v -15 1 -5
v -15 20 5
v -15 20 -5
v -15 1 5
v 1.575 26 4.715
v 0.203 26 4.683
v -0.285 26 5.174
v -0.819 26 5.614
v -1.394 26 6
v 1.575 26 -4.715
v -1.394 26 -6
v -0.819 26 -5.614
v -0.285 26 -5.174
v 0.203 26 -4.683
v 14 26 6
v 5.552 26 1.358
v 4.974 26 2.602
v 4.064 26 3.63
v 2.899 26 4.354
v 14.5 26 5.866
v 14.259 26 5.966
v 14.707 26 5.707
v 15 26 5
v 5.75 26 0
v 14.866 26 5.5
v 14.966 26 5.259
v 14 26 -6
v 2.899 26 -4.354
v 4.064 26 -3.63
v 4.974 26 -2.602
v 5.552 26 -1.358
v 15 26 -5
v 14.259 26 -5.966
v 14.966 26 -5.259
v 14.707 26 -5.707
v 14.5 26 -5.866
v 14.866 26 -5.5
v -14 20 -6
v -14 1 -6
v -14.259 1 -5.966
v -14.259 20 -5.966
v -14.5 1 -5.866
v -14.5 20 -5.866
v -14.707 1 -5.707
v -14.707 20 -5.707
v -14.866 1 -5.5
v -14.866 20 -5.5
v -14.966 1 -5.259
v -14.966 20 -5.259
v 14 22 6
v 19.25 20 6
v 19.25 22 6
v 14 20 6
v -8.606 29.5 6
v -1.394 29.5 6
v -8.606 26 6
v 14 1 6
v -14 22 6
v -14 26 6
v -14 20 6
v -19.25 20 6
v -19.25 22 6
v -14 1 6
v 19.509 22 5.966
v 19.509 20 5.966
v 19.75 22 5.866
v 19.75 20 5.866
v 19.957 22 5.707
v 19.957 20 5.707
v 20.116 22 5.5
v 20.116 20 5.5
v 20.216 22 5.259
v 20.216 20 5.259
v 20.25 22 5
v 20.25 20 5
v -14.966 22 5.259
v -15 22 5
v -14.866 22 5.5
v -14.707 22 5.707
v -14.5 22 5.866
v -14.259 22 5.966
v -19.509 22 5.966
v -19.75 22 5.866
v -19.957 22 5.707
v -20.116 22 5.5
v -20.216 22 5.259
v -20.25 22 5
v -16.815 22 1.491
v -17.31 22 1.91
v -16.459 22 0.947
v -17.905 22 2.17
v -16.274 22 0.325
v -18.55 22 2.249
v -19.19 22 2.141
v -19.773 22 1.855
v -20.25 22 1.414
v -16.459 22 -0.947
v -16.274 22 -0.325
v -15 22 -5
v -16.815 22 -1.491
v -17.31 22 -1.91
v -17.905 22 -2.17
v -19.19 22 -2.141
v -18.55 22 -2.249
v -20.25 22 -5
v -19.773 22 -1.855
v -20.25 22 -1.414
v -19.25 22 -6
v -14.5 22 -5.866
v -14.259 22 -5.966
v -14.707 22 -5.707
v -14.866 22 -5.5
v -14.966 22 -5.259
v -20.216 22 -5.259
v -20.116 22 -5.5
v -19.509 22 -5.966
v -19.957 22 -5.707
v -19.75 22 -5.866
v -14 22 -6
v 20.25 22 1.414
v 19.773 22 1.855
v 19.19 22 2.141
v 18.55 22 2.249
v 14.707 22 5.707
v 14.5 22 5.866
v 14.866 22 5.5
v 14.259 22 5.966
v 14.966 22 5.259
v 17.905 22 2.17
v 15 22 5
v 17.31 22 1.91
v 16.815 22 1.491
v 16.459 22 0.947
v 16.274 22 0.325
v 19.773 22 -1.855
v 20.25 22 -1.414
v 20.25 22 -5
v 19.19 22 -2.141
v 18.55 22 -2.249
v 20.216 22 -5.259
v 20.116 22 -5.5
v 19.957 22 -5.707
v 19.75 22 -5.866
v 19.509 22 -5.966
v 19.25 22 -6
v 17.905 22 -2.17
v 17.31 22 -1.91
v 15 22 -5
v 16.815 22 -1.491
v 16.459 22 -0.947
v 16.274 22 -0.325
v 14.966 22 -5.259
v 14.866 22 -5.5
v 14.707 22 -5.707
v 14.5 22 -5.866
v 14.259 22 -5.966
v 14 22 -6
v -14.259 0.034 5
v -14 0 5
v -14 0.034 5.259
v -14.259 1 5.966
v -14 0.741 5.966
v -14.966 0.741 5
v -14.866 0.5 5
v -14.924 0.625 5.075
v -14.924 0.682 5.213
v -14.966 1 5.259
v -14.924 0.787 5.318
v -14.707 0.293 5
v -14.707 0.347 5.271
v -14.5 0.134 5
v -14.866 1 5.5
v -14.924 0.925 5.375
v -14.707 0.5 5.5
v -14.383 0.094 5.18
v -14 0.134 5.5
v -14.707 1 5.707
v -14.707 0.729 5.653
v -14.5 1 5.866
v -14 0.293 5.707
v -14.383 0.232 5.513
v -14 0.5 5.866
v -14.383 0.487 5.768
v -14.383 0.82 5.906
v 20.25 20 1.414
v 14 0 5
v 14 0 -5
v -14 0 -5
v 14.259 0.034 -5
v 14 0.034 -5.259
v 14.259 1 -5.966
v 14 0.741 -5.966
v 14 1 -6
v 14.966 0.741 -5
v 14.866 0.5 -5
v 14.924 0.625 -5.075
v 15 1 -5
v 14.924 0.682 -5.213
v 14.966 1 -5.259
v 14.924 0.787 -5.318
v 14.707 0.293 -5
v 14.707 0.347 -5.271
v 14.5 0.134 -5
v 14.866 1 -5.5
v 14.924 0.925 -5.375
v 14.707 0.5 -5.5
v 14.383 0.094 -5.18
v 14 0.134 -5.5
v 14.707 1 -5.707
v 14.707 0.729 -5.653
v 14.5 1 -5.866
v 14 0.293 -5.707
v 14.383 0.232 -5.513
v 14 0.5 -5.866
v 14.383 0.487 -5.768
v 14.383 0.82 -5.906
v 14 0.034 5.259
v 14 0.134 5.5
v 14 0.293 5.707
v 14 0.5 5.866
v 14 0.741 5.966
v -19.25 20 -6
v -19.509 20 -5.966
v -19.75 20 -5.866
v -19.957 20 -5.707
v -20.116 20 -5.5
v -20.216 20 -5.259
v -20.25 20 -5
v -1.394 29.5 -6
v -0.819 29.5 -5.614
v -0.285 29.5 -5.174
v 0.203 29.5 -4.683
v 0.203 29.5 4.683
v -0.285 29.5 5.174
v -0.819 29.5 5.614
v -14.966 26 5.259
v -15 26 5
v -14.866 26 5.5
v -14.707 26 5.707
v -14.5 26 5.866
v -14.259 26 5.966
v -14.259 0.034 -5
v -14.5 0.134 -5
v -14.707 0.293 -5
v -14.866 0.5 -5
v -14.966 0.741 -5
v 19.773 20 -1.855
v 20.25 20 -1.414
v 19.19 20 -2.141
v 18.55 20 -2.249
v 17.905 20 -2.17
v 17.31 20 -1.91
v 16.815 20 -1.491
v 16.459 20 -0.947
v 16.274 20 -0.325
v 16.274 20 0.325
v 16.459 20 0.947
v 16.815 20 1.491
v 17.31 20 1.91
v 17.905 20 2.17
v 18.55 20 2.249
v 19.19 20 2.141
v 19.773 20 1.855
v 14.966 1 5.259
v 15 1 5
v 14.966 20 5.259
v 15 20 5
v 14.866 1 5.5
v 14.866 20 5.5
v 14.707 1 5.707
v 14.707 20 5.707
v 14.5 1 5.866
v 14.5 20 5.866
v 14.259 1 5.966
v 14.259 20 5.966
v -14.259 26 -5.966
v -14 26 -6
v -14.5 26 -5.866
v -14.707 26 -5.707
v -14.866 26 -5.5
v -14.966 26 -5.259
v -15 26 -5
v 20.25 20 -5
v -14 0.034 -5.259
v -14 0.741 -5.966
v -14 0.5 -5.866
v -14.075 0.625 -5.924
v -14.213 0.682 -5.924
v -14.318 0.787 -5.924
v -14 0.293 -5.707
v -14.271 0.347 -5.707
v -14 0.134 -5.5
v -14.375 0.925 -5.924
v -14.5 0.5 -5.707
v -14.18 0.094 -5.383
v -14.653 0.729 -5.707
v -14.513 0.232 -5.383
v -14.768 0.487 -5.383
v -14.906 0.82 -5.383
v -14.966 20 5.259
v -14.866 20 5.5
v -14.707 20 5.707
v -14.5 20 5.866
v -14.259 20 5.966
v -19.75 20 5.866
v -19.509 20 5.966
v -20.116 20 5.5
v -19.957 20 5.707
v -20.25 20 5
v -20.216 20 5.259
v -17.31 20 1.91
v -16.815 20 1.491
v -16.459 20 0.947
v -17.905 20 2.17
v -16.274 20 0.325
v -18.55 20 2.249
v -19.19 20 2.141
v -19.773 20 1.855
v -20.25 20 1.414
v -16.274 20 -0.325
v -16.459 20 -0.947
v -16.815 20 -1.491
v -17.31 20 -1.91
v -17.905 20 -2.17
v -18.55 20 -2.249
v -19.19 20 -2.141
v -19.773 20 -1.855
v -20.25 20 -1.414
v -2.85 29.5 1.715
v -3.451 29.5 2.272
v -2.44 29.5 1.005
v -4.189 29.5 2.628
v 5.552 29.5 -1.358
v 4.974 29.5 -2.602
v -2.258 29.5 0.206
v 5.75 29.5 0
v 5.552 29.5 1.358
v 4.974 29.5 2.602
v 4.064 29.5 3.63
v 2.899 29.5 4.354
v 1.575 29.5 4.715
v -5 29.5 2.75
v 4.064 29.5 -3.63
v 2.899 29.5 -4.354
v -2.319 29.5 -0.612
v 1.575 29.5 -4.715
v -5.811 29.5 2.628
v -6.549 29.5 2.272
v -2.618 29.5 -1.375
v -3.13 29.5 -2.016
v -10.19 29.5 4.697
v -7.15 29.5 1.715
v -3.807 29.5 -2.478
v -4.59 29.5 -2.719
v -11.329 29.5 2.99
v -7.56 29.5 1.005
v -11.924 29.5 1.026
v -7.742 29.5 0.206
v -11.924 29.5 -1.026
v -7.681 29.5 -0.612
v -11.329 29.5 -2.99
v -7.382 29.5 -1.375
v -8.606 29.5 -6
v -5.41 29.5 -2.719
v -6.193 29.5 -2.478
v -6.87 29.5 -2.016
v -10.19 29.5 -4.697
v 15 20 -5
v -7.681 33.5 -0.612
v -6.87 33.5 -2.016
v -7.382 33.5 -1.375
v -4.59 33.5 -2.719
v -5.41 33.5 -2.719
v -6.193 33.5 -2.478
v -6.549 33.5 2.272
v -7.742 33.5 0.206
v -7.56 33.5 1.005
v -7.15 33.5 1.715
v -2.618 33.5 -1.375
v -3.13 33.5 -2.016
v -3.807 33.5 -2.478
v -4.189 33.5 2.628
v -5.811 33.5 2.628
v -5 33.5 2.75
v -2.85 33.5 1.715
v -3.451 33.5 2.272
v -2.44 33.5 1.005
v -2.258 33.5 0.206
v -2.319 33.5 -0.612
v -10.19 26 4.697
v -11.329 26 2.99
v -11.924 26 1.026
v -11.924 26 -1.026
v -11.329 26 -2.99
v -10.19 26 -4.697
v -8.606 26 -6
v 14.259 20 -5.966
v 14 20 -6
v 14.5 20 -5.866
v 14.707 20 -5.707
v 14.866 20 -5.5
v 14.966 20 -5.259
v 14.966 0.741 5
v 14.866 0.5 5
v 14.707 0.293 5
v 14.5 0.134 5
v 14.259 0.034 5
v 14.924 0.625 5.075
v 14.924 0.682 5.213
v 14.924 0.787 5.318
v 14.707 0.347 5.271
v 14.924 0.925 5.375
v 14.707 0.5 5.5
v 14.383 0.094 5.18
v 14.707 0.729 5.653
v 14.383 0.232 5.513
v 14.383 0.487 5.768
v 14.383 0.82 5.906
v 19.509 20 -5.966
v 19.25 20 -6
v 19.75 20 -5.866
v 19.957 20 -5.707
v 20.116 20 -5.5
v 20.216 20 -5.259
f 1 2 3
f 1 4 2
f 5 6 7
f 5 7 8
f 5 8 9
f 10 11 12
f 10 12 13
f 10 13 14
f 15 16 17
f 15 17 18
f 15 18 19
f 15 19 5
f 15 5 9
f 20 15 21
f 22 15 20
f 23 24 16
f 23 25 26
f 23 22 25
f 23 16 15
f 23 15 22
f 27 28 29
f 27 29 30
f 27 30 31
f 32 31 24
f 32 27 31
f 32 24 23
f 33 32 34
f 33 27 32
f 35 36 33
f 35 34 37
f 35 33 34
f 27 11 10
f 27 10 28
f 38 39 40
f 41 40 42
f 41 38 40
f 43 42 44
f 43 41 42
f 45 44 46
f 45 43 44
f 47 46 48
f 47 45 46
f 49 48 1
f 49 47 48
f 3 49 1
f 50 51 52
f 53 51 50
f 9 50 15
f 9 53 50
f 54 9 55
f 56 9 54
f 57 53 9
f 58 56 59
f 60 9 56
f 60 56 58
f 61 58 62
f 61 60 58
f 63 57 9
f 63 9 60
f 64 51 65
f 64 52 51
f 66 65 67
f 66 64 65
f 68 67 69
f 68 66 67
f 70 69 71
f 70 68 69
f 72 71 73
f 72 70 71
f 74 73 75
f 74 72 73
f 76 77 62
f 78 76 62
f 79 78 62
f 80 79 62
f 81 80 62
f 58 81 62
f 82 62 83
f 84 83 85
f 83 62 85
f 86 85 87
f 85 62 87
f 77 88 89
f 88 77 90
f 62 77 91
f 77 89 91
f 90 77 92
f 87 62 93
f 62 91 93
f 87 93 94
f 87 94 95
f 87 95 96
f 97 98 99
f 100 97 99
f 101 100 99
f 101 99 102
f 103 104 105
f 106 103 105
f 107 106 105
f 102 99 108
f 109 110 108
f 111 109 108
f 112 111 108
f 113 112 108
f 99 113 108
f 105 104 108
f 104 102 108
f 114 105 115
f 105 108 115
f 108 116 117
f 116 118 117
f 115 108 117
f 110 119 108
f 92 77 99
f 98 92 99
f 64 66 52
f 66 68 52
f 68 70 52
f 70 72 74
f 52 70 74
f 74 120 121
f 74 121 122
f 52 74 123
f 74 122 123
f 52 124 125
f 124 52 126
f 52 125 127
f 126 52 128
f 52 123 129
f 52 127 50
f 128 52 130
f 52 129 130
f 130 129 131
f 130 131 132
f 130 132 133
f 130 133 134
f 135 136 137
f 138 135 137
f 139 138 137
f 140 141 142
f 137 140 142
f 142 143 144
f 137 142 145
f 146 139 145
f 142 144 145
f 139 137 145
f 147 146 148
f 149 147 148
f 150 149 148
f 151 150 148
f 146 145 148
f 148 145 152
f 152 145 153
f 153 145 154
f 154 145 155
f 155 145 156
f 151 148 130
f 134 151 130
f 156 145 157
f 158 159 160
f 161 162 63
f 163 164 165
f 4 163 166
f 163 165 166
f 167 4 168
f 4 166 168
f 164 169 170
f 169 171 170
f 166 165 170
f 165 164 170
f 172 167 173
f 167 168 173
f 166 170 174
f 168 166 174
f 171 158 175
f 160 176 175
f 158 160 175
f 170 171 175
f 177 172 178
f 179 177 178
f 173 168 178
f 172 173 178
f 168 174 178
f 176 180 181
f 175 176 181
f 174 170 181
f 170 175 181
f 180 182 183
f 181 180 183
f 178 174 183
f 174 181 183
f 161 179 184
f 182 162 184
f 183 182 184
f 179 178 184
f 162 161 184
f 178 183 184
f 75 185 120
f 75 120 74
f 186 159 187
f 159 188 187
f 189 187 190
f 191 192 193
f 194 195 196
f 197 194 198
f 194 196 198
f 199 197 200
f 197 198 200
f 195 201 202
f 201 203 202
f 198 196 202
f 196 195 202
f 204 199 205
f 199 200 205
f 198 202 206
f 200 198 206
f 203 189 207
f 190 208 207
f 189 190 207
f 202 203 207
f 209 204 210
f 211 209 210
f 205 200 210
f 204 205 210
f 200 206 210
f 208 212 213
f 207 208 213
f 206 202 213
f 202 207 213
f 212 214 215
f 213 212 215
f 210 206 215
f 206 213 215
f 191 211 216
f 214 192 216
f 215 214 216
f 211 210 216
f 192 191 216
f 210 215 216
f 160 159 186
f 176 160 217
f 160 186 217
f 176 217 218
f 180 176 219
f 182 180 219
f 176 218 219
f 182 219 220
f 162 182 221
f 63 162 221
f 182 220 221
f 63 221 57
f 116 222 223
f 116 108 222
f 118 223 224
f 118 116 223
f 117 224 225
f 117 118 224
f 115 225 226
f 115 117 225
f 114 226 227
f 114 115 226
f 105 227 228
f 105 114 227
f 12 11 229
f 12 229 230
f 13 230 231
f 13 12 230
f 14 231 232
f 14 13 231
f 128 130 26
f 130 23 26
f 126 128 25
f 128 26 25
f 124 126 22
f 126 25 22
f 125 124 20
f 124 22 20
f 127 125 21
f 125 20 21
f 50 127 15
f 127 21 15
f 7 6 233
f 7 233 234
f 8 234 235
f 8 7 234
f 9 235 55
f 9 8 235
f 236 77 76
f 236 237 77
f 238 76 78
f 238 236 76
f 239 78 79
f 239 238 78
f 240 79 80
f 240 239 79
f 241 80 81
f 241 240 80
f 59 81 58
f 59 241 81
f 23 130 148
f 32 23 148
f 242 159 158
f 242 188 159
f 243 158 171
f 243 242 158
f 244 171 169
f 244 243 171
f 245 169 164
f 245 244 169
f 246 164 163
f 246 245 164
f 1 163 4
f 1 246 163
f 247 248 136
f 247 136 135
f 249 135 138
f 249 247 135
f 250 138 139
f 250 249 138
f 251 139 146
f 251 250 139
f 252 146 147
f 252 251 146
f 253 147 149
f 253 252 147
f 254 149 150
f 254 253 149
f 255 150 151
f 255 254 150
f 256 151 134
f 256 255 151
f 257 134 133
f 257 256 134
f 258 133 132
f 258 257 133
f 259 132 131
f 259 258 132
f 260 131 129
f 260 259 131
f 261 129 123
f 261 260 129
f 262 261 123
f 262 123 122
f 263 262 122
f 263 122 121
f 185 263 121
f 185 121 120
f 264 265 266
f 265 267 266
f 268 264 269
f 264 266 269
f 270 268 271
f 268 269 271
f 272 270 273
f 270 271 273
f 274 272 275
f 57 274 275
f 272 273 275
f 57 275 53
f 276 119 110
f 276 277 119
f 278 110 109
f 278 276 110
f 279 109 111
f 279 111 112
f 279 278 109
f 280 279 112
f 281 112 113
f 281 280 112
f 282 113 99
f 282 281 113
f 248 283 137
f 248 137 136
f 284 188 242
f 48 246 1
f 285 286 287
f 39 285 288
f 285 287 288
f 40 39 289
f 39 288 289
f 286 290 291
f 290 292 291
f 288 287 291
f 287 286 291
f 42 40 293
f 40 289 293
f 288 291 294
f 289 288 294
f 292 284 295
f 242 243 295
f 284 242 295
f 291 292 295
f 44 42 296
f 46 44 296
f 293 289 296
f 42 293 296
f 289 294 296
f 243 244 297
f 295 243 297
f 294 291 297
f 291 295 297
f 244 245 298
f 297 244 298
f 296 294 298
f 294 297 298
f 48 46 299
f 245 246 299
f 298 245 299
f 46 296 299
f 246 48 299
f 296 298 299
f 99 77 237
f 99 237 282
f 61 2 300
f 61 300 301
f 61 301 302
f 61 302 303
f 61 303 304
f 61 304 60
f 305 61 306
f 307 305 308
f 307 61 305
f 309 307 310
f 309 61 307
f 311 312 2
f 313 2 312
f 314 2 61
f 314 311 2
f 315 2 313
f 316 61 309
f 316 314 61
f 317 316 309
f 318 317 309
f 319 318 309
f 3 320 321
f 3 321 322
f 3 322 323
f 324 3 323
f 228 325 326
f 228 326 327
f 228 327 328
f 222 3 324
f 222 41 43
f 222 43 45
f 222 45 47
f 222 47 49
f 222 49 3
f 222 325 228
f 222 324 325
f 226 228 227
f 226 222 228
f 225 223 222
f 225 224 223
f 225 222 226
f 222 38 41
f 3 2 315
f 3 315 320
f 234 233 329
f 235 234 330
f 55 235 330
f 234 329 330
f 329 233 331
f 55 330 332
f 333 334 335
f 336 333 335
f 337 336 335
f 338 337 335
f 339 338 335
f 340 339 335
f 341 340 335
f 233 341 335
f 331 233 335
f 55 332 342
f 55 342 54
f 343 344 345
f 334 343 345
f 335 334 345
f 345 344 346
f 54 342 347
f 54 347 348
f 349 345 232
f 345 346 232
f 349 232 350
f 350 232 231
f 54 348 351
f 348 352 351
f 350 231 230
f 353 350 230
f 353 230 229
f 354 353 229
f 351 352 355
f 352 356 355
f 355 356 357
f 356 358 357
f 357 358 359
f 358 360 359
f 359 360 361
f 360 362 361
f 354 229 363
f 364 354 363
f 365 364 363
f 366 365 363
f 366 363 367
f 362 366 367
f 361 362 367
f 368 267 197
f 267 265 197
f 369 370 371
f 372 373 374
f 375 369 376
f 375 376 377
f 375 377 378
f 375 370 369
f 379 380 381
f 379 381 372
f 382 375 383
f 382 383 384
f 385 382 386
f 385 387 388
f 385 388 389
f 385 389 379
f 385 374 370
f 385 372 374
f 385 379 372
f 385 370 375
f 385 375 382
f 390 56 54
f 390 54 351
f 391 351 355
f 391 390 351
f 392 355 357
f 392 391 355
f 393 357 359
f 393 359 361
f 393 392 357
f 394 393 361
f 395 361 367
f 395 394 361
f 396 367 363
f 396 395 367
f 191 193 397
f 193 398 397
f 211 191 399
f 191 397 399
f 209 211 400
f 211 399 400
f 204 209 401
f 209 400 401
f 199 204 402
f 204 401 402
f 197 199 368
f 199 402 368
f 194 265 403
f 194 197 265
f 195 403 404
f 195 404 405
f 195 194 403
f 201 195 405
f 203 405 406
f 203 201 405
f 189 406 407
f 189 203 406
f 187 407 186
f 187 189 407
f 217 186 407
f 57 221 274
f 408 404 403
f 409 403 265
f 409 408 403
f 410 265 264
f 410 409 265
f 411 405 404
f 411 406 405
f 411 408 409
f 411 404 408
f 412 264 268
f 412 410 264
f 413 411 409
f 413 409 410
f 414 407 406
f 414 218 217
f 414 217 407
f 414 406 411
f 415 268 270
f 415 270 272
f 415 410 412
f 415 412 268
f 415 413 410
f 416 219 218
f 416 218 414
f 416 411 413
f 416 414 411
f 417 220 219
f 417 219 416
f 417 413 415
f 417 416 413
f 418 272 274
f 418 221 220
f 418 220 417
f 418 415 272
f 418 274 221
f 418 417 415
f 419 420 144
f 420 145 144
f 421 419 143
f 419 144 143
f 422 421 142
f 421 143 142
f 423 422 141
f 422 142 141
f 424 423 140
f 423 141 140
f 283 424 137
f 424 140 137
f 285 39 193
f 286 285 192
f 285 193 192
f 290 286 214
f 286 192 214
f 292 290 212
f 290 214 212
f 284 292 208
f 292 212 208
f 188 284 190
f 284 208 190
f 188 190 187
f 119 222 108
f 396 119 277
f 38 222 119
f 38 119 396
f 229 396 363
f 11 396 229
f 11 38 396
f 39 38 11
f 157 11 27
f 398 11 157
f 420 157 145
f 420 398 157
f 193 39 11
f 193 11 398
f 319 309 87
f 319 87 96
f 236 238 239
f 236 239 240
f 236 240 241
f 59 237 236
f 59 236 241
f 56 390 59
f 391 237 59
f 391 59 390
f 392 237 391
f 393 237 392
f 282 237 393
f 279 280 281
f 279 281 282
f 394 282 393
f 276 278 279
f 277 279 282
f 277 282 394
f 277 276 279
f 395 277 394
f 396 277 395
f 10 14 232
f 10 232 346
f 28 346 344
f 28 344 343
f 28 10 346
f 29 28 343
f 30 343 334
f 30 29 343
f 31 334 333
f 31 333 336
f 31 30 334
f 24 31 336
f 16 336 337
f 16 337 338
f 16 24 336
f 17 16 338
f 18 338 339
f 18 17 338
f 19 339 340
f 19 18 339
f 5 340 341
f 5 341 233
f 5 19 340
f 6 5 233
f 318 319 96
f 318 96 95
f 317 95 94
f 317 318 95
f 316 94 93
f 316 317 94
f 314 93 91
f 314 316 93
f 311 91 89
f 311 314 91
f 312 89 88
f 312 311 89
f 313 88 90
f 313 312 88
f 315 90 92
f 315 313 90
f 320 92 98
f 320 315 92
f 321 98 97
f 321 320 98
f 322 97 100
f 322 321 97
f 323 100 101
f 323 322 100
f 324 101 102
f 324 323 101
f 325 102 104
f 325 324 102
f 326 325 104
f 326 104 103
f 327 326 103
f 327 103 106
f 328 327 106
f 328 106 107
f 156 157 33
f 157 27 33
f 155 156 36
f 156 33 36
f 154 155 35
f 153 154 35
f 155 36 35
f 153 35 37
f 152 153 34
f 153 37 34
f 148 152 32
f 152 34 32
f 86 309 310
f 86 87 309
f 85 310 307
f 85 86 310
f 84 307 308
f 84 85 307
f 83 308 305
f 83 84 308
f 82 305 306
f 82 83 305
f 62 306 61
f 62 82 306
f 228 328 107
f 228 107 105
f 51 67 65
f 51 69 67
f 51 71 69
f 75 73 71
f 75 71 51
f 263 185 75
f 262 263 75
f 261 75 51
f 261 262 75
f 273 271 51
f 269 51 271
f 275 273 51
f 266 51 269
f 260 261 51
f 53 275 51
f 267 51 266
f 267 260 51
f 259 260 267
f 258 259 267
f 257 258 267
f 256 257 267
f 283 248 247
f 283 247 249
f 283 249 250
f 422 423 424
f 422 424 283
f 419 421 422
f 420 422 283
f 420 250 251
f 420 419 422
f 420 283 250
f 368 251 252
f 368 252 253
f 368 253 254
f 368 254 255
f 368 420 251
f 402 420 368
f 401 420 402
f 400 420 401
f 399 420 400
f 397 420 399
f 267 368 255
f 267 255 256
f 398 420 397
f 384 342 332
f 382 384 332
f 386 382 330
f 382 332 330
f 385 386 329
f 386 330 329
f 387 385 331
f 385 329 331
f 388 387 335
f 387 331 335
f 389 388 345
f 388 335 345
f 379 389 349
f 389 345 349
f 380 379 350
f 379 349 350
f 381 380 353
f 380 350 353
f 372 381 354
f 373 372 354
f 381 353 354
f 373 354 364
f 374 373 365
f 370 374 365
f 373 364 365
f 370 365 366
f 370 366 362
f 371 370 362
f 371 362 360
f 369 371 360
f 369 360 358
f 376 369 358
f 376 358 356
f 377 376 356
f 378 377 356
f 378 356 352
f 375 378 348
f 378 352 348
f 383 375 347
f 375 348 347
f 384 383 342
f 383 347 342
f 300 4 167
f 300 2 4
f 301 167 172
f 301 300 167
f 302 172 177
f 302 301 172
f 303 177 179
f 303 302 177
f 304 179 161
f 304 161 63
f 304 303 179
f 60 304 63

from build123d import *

# Parameters (mm, degrees)
SKETCH1_W           = 30
SKETCH1_H           = 12
BOSS_EXTRUDE1_DEPTH = 20
BOSS_EXTRUDE2_DEPTH = 2
SKETCH3_W           = 30
SKETCH3_H           = 12
BOSS_EXTRUDE3_DEPTH = 4
BOSS_EXTRUDE4_DEPTH = 3.5
SKETCH5_R           = 2.75
BOSS_EXTRUDE5_DEPTH = 4
FILLET1_R           = 1


with BuildPart() as part:
    # Sketch1 → Boss-Extrude1 (new body)
    with BuildSketch(Plane(origin=(0, 0, 0), x_dir=(1, 0, 0), z_dir=(0, 1, 0))):
        Rectangle(SKETCH1_W, SKETCH1_H)
    extrude(amount=BOSS_EXTRUDE1_DEPTH)

    # Sketch2 → Boss-Extrude2 (add)
    with BuildSketch(Plane(origin=(0, 20, 0), x_dir=(1, 0, 0), z_dir=(0, 1, 0))):
        with BuildLine():
            Line((-20.25, 6), (20.25, 6))
            Line((20.25, 6), (20.25, 1.414213562))
            ThreePointArc((20.25, 1.414213562), (16.25, 0), (20.25, -1.414213562))
            Line((20.25, -1.414213562), (20.25, -6))
            Line((20.25, -6), (-20.25, -6))
            Line((-20.25, -6), (-20.25, -1.414213562))
            ThreePointArc((-20.25, -1.414213562), (-16.25, 0), (-20.25, 1.414213562))
            Line((-20.25, 1.414213562), (-20.25, 6))
        make_face()
    extrude(amount=BOSS_EXTRUDE2_DEPTH)

    # Sketch3 → Boss-Extrude3 (add)
    with BuildSketch(Plane(origin=(0, 22, 0), x_dir=(1, 0, 0), z_dir=(0, 1, 0))):
        Rectangle(SKETCH3_W, SKETCH3_H)
    extrude(amount=BOSS_EXTRUDE3_DEPTH)

    # Sketch4 → Boss-Extrude4 (add)
    with BuildSketch(Plane(origin=(0, 26, 0), x_dir=(1, 0, 0), z_dir=(0, 1, 0))):
        with BuildLine():
            Line((-8.605551275, 6), (-1.394448725, 6))
            ThreePointArc((-1.394448725, 6), (-0.546683534, 5.400738139), (0.203125, 4.682679813))
            ThreePointArc((0.203125, 4.682679813), (5.75, 0), (0.203125, -4.682679813))
            ThreePointArc((0.203125, -4.682679813), (-0.546683534, -5.400738139), (-1.394448725, -6))
            Line((-1.394448725, -6), (-8.605551275, -6))
            ThreePointArc((-8.605551275, -6), (-12, 0), (-8.605551275, 6))
        make_face()
    extrude(amount=BOSS_EXTRUDE4_DEPTH)

    # Sketch5 → Boss-Extrude5 (add)
    with BuildSketch(Plane(origin=(0, 29.5, 0), x_dir=(1, 0, 0), z_dir=(0, 1, 0))):
        with Locations(Location((-5, 0, 0), (0, 0, 270))):
            Circle(SKETCH5_R)
    extrude(amount=BOSS_EXTRUDE5_DEPTH)

    # Fillet1
    fillet1_edges = [part.edges().sort_by_distance(p)[0] for p in [
        (20.25, 21, 6),
        (20.25, 21, -6),
        (-20.25, 21, -6),
        (-20.25, 21, 6),
        (15, 24, 6),
        (15, 24, -6),
        (-15, 24, -6),
        (-15, 24, 6),
        (0, 0, 6),
        (-15, 0, 0),
        (0, 0, -6),
        (15, 0, 0),
        (15, 10, 6),
        (-15, 10, 6),
        (-15, 10, -6),
        (15, 10, -6),
    ]]
    fillet(fillet1_edges, radius=FILLET1_R)


solid = part.part
